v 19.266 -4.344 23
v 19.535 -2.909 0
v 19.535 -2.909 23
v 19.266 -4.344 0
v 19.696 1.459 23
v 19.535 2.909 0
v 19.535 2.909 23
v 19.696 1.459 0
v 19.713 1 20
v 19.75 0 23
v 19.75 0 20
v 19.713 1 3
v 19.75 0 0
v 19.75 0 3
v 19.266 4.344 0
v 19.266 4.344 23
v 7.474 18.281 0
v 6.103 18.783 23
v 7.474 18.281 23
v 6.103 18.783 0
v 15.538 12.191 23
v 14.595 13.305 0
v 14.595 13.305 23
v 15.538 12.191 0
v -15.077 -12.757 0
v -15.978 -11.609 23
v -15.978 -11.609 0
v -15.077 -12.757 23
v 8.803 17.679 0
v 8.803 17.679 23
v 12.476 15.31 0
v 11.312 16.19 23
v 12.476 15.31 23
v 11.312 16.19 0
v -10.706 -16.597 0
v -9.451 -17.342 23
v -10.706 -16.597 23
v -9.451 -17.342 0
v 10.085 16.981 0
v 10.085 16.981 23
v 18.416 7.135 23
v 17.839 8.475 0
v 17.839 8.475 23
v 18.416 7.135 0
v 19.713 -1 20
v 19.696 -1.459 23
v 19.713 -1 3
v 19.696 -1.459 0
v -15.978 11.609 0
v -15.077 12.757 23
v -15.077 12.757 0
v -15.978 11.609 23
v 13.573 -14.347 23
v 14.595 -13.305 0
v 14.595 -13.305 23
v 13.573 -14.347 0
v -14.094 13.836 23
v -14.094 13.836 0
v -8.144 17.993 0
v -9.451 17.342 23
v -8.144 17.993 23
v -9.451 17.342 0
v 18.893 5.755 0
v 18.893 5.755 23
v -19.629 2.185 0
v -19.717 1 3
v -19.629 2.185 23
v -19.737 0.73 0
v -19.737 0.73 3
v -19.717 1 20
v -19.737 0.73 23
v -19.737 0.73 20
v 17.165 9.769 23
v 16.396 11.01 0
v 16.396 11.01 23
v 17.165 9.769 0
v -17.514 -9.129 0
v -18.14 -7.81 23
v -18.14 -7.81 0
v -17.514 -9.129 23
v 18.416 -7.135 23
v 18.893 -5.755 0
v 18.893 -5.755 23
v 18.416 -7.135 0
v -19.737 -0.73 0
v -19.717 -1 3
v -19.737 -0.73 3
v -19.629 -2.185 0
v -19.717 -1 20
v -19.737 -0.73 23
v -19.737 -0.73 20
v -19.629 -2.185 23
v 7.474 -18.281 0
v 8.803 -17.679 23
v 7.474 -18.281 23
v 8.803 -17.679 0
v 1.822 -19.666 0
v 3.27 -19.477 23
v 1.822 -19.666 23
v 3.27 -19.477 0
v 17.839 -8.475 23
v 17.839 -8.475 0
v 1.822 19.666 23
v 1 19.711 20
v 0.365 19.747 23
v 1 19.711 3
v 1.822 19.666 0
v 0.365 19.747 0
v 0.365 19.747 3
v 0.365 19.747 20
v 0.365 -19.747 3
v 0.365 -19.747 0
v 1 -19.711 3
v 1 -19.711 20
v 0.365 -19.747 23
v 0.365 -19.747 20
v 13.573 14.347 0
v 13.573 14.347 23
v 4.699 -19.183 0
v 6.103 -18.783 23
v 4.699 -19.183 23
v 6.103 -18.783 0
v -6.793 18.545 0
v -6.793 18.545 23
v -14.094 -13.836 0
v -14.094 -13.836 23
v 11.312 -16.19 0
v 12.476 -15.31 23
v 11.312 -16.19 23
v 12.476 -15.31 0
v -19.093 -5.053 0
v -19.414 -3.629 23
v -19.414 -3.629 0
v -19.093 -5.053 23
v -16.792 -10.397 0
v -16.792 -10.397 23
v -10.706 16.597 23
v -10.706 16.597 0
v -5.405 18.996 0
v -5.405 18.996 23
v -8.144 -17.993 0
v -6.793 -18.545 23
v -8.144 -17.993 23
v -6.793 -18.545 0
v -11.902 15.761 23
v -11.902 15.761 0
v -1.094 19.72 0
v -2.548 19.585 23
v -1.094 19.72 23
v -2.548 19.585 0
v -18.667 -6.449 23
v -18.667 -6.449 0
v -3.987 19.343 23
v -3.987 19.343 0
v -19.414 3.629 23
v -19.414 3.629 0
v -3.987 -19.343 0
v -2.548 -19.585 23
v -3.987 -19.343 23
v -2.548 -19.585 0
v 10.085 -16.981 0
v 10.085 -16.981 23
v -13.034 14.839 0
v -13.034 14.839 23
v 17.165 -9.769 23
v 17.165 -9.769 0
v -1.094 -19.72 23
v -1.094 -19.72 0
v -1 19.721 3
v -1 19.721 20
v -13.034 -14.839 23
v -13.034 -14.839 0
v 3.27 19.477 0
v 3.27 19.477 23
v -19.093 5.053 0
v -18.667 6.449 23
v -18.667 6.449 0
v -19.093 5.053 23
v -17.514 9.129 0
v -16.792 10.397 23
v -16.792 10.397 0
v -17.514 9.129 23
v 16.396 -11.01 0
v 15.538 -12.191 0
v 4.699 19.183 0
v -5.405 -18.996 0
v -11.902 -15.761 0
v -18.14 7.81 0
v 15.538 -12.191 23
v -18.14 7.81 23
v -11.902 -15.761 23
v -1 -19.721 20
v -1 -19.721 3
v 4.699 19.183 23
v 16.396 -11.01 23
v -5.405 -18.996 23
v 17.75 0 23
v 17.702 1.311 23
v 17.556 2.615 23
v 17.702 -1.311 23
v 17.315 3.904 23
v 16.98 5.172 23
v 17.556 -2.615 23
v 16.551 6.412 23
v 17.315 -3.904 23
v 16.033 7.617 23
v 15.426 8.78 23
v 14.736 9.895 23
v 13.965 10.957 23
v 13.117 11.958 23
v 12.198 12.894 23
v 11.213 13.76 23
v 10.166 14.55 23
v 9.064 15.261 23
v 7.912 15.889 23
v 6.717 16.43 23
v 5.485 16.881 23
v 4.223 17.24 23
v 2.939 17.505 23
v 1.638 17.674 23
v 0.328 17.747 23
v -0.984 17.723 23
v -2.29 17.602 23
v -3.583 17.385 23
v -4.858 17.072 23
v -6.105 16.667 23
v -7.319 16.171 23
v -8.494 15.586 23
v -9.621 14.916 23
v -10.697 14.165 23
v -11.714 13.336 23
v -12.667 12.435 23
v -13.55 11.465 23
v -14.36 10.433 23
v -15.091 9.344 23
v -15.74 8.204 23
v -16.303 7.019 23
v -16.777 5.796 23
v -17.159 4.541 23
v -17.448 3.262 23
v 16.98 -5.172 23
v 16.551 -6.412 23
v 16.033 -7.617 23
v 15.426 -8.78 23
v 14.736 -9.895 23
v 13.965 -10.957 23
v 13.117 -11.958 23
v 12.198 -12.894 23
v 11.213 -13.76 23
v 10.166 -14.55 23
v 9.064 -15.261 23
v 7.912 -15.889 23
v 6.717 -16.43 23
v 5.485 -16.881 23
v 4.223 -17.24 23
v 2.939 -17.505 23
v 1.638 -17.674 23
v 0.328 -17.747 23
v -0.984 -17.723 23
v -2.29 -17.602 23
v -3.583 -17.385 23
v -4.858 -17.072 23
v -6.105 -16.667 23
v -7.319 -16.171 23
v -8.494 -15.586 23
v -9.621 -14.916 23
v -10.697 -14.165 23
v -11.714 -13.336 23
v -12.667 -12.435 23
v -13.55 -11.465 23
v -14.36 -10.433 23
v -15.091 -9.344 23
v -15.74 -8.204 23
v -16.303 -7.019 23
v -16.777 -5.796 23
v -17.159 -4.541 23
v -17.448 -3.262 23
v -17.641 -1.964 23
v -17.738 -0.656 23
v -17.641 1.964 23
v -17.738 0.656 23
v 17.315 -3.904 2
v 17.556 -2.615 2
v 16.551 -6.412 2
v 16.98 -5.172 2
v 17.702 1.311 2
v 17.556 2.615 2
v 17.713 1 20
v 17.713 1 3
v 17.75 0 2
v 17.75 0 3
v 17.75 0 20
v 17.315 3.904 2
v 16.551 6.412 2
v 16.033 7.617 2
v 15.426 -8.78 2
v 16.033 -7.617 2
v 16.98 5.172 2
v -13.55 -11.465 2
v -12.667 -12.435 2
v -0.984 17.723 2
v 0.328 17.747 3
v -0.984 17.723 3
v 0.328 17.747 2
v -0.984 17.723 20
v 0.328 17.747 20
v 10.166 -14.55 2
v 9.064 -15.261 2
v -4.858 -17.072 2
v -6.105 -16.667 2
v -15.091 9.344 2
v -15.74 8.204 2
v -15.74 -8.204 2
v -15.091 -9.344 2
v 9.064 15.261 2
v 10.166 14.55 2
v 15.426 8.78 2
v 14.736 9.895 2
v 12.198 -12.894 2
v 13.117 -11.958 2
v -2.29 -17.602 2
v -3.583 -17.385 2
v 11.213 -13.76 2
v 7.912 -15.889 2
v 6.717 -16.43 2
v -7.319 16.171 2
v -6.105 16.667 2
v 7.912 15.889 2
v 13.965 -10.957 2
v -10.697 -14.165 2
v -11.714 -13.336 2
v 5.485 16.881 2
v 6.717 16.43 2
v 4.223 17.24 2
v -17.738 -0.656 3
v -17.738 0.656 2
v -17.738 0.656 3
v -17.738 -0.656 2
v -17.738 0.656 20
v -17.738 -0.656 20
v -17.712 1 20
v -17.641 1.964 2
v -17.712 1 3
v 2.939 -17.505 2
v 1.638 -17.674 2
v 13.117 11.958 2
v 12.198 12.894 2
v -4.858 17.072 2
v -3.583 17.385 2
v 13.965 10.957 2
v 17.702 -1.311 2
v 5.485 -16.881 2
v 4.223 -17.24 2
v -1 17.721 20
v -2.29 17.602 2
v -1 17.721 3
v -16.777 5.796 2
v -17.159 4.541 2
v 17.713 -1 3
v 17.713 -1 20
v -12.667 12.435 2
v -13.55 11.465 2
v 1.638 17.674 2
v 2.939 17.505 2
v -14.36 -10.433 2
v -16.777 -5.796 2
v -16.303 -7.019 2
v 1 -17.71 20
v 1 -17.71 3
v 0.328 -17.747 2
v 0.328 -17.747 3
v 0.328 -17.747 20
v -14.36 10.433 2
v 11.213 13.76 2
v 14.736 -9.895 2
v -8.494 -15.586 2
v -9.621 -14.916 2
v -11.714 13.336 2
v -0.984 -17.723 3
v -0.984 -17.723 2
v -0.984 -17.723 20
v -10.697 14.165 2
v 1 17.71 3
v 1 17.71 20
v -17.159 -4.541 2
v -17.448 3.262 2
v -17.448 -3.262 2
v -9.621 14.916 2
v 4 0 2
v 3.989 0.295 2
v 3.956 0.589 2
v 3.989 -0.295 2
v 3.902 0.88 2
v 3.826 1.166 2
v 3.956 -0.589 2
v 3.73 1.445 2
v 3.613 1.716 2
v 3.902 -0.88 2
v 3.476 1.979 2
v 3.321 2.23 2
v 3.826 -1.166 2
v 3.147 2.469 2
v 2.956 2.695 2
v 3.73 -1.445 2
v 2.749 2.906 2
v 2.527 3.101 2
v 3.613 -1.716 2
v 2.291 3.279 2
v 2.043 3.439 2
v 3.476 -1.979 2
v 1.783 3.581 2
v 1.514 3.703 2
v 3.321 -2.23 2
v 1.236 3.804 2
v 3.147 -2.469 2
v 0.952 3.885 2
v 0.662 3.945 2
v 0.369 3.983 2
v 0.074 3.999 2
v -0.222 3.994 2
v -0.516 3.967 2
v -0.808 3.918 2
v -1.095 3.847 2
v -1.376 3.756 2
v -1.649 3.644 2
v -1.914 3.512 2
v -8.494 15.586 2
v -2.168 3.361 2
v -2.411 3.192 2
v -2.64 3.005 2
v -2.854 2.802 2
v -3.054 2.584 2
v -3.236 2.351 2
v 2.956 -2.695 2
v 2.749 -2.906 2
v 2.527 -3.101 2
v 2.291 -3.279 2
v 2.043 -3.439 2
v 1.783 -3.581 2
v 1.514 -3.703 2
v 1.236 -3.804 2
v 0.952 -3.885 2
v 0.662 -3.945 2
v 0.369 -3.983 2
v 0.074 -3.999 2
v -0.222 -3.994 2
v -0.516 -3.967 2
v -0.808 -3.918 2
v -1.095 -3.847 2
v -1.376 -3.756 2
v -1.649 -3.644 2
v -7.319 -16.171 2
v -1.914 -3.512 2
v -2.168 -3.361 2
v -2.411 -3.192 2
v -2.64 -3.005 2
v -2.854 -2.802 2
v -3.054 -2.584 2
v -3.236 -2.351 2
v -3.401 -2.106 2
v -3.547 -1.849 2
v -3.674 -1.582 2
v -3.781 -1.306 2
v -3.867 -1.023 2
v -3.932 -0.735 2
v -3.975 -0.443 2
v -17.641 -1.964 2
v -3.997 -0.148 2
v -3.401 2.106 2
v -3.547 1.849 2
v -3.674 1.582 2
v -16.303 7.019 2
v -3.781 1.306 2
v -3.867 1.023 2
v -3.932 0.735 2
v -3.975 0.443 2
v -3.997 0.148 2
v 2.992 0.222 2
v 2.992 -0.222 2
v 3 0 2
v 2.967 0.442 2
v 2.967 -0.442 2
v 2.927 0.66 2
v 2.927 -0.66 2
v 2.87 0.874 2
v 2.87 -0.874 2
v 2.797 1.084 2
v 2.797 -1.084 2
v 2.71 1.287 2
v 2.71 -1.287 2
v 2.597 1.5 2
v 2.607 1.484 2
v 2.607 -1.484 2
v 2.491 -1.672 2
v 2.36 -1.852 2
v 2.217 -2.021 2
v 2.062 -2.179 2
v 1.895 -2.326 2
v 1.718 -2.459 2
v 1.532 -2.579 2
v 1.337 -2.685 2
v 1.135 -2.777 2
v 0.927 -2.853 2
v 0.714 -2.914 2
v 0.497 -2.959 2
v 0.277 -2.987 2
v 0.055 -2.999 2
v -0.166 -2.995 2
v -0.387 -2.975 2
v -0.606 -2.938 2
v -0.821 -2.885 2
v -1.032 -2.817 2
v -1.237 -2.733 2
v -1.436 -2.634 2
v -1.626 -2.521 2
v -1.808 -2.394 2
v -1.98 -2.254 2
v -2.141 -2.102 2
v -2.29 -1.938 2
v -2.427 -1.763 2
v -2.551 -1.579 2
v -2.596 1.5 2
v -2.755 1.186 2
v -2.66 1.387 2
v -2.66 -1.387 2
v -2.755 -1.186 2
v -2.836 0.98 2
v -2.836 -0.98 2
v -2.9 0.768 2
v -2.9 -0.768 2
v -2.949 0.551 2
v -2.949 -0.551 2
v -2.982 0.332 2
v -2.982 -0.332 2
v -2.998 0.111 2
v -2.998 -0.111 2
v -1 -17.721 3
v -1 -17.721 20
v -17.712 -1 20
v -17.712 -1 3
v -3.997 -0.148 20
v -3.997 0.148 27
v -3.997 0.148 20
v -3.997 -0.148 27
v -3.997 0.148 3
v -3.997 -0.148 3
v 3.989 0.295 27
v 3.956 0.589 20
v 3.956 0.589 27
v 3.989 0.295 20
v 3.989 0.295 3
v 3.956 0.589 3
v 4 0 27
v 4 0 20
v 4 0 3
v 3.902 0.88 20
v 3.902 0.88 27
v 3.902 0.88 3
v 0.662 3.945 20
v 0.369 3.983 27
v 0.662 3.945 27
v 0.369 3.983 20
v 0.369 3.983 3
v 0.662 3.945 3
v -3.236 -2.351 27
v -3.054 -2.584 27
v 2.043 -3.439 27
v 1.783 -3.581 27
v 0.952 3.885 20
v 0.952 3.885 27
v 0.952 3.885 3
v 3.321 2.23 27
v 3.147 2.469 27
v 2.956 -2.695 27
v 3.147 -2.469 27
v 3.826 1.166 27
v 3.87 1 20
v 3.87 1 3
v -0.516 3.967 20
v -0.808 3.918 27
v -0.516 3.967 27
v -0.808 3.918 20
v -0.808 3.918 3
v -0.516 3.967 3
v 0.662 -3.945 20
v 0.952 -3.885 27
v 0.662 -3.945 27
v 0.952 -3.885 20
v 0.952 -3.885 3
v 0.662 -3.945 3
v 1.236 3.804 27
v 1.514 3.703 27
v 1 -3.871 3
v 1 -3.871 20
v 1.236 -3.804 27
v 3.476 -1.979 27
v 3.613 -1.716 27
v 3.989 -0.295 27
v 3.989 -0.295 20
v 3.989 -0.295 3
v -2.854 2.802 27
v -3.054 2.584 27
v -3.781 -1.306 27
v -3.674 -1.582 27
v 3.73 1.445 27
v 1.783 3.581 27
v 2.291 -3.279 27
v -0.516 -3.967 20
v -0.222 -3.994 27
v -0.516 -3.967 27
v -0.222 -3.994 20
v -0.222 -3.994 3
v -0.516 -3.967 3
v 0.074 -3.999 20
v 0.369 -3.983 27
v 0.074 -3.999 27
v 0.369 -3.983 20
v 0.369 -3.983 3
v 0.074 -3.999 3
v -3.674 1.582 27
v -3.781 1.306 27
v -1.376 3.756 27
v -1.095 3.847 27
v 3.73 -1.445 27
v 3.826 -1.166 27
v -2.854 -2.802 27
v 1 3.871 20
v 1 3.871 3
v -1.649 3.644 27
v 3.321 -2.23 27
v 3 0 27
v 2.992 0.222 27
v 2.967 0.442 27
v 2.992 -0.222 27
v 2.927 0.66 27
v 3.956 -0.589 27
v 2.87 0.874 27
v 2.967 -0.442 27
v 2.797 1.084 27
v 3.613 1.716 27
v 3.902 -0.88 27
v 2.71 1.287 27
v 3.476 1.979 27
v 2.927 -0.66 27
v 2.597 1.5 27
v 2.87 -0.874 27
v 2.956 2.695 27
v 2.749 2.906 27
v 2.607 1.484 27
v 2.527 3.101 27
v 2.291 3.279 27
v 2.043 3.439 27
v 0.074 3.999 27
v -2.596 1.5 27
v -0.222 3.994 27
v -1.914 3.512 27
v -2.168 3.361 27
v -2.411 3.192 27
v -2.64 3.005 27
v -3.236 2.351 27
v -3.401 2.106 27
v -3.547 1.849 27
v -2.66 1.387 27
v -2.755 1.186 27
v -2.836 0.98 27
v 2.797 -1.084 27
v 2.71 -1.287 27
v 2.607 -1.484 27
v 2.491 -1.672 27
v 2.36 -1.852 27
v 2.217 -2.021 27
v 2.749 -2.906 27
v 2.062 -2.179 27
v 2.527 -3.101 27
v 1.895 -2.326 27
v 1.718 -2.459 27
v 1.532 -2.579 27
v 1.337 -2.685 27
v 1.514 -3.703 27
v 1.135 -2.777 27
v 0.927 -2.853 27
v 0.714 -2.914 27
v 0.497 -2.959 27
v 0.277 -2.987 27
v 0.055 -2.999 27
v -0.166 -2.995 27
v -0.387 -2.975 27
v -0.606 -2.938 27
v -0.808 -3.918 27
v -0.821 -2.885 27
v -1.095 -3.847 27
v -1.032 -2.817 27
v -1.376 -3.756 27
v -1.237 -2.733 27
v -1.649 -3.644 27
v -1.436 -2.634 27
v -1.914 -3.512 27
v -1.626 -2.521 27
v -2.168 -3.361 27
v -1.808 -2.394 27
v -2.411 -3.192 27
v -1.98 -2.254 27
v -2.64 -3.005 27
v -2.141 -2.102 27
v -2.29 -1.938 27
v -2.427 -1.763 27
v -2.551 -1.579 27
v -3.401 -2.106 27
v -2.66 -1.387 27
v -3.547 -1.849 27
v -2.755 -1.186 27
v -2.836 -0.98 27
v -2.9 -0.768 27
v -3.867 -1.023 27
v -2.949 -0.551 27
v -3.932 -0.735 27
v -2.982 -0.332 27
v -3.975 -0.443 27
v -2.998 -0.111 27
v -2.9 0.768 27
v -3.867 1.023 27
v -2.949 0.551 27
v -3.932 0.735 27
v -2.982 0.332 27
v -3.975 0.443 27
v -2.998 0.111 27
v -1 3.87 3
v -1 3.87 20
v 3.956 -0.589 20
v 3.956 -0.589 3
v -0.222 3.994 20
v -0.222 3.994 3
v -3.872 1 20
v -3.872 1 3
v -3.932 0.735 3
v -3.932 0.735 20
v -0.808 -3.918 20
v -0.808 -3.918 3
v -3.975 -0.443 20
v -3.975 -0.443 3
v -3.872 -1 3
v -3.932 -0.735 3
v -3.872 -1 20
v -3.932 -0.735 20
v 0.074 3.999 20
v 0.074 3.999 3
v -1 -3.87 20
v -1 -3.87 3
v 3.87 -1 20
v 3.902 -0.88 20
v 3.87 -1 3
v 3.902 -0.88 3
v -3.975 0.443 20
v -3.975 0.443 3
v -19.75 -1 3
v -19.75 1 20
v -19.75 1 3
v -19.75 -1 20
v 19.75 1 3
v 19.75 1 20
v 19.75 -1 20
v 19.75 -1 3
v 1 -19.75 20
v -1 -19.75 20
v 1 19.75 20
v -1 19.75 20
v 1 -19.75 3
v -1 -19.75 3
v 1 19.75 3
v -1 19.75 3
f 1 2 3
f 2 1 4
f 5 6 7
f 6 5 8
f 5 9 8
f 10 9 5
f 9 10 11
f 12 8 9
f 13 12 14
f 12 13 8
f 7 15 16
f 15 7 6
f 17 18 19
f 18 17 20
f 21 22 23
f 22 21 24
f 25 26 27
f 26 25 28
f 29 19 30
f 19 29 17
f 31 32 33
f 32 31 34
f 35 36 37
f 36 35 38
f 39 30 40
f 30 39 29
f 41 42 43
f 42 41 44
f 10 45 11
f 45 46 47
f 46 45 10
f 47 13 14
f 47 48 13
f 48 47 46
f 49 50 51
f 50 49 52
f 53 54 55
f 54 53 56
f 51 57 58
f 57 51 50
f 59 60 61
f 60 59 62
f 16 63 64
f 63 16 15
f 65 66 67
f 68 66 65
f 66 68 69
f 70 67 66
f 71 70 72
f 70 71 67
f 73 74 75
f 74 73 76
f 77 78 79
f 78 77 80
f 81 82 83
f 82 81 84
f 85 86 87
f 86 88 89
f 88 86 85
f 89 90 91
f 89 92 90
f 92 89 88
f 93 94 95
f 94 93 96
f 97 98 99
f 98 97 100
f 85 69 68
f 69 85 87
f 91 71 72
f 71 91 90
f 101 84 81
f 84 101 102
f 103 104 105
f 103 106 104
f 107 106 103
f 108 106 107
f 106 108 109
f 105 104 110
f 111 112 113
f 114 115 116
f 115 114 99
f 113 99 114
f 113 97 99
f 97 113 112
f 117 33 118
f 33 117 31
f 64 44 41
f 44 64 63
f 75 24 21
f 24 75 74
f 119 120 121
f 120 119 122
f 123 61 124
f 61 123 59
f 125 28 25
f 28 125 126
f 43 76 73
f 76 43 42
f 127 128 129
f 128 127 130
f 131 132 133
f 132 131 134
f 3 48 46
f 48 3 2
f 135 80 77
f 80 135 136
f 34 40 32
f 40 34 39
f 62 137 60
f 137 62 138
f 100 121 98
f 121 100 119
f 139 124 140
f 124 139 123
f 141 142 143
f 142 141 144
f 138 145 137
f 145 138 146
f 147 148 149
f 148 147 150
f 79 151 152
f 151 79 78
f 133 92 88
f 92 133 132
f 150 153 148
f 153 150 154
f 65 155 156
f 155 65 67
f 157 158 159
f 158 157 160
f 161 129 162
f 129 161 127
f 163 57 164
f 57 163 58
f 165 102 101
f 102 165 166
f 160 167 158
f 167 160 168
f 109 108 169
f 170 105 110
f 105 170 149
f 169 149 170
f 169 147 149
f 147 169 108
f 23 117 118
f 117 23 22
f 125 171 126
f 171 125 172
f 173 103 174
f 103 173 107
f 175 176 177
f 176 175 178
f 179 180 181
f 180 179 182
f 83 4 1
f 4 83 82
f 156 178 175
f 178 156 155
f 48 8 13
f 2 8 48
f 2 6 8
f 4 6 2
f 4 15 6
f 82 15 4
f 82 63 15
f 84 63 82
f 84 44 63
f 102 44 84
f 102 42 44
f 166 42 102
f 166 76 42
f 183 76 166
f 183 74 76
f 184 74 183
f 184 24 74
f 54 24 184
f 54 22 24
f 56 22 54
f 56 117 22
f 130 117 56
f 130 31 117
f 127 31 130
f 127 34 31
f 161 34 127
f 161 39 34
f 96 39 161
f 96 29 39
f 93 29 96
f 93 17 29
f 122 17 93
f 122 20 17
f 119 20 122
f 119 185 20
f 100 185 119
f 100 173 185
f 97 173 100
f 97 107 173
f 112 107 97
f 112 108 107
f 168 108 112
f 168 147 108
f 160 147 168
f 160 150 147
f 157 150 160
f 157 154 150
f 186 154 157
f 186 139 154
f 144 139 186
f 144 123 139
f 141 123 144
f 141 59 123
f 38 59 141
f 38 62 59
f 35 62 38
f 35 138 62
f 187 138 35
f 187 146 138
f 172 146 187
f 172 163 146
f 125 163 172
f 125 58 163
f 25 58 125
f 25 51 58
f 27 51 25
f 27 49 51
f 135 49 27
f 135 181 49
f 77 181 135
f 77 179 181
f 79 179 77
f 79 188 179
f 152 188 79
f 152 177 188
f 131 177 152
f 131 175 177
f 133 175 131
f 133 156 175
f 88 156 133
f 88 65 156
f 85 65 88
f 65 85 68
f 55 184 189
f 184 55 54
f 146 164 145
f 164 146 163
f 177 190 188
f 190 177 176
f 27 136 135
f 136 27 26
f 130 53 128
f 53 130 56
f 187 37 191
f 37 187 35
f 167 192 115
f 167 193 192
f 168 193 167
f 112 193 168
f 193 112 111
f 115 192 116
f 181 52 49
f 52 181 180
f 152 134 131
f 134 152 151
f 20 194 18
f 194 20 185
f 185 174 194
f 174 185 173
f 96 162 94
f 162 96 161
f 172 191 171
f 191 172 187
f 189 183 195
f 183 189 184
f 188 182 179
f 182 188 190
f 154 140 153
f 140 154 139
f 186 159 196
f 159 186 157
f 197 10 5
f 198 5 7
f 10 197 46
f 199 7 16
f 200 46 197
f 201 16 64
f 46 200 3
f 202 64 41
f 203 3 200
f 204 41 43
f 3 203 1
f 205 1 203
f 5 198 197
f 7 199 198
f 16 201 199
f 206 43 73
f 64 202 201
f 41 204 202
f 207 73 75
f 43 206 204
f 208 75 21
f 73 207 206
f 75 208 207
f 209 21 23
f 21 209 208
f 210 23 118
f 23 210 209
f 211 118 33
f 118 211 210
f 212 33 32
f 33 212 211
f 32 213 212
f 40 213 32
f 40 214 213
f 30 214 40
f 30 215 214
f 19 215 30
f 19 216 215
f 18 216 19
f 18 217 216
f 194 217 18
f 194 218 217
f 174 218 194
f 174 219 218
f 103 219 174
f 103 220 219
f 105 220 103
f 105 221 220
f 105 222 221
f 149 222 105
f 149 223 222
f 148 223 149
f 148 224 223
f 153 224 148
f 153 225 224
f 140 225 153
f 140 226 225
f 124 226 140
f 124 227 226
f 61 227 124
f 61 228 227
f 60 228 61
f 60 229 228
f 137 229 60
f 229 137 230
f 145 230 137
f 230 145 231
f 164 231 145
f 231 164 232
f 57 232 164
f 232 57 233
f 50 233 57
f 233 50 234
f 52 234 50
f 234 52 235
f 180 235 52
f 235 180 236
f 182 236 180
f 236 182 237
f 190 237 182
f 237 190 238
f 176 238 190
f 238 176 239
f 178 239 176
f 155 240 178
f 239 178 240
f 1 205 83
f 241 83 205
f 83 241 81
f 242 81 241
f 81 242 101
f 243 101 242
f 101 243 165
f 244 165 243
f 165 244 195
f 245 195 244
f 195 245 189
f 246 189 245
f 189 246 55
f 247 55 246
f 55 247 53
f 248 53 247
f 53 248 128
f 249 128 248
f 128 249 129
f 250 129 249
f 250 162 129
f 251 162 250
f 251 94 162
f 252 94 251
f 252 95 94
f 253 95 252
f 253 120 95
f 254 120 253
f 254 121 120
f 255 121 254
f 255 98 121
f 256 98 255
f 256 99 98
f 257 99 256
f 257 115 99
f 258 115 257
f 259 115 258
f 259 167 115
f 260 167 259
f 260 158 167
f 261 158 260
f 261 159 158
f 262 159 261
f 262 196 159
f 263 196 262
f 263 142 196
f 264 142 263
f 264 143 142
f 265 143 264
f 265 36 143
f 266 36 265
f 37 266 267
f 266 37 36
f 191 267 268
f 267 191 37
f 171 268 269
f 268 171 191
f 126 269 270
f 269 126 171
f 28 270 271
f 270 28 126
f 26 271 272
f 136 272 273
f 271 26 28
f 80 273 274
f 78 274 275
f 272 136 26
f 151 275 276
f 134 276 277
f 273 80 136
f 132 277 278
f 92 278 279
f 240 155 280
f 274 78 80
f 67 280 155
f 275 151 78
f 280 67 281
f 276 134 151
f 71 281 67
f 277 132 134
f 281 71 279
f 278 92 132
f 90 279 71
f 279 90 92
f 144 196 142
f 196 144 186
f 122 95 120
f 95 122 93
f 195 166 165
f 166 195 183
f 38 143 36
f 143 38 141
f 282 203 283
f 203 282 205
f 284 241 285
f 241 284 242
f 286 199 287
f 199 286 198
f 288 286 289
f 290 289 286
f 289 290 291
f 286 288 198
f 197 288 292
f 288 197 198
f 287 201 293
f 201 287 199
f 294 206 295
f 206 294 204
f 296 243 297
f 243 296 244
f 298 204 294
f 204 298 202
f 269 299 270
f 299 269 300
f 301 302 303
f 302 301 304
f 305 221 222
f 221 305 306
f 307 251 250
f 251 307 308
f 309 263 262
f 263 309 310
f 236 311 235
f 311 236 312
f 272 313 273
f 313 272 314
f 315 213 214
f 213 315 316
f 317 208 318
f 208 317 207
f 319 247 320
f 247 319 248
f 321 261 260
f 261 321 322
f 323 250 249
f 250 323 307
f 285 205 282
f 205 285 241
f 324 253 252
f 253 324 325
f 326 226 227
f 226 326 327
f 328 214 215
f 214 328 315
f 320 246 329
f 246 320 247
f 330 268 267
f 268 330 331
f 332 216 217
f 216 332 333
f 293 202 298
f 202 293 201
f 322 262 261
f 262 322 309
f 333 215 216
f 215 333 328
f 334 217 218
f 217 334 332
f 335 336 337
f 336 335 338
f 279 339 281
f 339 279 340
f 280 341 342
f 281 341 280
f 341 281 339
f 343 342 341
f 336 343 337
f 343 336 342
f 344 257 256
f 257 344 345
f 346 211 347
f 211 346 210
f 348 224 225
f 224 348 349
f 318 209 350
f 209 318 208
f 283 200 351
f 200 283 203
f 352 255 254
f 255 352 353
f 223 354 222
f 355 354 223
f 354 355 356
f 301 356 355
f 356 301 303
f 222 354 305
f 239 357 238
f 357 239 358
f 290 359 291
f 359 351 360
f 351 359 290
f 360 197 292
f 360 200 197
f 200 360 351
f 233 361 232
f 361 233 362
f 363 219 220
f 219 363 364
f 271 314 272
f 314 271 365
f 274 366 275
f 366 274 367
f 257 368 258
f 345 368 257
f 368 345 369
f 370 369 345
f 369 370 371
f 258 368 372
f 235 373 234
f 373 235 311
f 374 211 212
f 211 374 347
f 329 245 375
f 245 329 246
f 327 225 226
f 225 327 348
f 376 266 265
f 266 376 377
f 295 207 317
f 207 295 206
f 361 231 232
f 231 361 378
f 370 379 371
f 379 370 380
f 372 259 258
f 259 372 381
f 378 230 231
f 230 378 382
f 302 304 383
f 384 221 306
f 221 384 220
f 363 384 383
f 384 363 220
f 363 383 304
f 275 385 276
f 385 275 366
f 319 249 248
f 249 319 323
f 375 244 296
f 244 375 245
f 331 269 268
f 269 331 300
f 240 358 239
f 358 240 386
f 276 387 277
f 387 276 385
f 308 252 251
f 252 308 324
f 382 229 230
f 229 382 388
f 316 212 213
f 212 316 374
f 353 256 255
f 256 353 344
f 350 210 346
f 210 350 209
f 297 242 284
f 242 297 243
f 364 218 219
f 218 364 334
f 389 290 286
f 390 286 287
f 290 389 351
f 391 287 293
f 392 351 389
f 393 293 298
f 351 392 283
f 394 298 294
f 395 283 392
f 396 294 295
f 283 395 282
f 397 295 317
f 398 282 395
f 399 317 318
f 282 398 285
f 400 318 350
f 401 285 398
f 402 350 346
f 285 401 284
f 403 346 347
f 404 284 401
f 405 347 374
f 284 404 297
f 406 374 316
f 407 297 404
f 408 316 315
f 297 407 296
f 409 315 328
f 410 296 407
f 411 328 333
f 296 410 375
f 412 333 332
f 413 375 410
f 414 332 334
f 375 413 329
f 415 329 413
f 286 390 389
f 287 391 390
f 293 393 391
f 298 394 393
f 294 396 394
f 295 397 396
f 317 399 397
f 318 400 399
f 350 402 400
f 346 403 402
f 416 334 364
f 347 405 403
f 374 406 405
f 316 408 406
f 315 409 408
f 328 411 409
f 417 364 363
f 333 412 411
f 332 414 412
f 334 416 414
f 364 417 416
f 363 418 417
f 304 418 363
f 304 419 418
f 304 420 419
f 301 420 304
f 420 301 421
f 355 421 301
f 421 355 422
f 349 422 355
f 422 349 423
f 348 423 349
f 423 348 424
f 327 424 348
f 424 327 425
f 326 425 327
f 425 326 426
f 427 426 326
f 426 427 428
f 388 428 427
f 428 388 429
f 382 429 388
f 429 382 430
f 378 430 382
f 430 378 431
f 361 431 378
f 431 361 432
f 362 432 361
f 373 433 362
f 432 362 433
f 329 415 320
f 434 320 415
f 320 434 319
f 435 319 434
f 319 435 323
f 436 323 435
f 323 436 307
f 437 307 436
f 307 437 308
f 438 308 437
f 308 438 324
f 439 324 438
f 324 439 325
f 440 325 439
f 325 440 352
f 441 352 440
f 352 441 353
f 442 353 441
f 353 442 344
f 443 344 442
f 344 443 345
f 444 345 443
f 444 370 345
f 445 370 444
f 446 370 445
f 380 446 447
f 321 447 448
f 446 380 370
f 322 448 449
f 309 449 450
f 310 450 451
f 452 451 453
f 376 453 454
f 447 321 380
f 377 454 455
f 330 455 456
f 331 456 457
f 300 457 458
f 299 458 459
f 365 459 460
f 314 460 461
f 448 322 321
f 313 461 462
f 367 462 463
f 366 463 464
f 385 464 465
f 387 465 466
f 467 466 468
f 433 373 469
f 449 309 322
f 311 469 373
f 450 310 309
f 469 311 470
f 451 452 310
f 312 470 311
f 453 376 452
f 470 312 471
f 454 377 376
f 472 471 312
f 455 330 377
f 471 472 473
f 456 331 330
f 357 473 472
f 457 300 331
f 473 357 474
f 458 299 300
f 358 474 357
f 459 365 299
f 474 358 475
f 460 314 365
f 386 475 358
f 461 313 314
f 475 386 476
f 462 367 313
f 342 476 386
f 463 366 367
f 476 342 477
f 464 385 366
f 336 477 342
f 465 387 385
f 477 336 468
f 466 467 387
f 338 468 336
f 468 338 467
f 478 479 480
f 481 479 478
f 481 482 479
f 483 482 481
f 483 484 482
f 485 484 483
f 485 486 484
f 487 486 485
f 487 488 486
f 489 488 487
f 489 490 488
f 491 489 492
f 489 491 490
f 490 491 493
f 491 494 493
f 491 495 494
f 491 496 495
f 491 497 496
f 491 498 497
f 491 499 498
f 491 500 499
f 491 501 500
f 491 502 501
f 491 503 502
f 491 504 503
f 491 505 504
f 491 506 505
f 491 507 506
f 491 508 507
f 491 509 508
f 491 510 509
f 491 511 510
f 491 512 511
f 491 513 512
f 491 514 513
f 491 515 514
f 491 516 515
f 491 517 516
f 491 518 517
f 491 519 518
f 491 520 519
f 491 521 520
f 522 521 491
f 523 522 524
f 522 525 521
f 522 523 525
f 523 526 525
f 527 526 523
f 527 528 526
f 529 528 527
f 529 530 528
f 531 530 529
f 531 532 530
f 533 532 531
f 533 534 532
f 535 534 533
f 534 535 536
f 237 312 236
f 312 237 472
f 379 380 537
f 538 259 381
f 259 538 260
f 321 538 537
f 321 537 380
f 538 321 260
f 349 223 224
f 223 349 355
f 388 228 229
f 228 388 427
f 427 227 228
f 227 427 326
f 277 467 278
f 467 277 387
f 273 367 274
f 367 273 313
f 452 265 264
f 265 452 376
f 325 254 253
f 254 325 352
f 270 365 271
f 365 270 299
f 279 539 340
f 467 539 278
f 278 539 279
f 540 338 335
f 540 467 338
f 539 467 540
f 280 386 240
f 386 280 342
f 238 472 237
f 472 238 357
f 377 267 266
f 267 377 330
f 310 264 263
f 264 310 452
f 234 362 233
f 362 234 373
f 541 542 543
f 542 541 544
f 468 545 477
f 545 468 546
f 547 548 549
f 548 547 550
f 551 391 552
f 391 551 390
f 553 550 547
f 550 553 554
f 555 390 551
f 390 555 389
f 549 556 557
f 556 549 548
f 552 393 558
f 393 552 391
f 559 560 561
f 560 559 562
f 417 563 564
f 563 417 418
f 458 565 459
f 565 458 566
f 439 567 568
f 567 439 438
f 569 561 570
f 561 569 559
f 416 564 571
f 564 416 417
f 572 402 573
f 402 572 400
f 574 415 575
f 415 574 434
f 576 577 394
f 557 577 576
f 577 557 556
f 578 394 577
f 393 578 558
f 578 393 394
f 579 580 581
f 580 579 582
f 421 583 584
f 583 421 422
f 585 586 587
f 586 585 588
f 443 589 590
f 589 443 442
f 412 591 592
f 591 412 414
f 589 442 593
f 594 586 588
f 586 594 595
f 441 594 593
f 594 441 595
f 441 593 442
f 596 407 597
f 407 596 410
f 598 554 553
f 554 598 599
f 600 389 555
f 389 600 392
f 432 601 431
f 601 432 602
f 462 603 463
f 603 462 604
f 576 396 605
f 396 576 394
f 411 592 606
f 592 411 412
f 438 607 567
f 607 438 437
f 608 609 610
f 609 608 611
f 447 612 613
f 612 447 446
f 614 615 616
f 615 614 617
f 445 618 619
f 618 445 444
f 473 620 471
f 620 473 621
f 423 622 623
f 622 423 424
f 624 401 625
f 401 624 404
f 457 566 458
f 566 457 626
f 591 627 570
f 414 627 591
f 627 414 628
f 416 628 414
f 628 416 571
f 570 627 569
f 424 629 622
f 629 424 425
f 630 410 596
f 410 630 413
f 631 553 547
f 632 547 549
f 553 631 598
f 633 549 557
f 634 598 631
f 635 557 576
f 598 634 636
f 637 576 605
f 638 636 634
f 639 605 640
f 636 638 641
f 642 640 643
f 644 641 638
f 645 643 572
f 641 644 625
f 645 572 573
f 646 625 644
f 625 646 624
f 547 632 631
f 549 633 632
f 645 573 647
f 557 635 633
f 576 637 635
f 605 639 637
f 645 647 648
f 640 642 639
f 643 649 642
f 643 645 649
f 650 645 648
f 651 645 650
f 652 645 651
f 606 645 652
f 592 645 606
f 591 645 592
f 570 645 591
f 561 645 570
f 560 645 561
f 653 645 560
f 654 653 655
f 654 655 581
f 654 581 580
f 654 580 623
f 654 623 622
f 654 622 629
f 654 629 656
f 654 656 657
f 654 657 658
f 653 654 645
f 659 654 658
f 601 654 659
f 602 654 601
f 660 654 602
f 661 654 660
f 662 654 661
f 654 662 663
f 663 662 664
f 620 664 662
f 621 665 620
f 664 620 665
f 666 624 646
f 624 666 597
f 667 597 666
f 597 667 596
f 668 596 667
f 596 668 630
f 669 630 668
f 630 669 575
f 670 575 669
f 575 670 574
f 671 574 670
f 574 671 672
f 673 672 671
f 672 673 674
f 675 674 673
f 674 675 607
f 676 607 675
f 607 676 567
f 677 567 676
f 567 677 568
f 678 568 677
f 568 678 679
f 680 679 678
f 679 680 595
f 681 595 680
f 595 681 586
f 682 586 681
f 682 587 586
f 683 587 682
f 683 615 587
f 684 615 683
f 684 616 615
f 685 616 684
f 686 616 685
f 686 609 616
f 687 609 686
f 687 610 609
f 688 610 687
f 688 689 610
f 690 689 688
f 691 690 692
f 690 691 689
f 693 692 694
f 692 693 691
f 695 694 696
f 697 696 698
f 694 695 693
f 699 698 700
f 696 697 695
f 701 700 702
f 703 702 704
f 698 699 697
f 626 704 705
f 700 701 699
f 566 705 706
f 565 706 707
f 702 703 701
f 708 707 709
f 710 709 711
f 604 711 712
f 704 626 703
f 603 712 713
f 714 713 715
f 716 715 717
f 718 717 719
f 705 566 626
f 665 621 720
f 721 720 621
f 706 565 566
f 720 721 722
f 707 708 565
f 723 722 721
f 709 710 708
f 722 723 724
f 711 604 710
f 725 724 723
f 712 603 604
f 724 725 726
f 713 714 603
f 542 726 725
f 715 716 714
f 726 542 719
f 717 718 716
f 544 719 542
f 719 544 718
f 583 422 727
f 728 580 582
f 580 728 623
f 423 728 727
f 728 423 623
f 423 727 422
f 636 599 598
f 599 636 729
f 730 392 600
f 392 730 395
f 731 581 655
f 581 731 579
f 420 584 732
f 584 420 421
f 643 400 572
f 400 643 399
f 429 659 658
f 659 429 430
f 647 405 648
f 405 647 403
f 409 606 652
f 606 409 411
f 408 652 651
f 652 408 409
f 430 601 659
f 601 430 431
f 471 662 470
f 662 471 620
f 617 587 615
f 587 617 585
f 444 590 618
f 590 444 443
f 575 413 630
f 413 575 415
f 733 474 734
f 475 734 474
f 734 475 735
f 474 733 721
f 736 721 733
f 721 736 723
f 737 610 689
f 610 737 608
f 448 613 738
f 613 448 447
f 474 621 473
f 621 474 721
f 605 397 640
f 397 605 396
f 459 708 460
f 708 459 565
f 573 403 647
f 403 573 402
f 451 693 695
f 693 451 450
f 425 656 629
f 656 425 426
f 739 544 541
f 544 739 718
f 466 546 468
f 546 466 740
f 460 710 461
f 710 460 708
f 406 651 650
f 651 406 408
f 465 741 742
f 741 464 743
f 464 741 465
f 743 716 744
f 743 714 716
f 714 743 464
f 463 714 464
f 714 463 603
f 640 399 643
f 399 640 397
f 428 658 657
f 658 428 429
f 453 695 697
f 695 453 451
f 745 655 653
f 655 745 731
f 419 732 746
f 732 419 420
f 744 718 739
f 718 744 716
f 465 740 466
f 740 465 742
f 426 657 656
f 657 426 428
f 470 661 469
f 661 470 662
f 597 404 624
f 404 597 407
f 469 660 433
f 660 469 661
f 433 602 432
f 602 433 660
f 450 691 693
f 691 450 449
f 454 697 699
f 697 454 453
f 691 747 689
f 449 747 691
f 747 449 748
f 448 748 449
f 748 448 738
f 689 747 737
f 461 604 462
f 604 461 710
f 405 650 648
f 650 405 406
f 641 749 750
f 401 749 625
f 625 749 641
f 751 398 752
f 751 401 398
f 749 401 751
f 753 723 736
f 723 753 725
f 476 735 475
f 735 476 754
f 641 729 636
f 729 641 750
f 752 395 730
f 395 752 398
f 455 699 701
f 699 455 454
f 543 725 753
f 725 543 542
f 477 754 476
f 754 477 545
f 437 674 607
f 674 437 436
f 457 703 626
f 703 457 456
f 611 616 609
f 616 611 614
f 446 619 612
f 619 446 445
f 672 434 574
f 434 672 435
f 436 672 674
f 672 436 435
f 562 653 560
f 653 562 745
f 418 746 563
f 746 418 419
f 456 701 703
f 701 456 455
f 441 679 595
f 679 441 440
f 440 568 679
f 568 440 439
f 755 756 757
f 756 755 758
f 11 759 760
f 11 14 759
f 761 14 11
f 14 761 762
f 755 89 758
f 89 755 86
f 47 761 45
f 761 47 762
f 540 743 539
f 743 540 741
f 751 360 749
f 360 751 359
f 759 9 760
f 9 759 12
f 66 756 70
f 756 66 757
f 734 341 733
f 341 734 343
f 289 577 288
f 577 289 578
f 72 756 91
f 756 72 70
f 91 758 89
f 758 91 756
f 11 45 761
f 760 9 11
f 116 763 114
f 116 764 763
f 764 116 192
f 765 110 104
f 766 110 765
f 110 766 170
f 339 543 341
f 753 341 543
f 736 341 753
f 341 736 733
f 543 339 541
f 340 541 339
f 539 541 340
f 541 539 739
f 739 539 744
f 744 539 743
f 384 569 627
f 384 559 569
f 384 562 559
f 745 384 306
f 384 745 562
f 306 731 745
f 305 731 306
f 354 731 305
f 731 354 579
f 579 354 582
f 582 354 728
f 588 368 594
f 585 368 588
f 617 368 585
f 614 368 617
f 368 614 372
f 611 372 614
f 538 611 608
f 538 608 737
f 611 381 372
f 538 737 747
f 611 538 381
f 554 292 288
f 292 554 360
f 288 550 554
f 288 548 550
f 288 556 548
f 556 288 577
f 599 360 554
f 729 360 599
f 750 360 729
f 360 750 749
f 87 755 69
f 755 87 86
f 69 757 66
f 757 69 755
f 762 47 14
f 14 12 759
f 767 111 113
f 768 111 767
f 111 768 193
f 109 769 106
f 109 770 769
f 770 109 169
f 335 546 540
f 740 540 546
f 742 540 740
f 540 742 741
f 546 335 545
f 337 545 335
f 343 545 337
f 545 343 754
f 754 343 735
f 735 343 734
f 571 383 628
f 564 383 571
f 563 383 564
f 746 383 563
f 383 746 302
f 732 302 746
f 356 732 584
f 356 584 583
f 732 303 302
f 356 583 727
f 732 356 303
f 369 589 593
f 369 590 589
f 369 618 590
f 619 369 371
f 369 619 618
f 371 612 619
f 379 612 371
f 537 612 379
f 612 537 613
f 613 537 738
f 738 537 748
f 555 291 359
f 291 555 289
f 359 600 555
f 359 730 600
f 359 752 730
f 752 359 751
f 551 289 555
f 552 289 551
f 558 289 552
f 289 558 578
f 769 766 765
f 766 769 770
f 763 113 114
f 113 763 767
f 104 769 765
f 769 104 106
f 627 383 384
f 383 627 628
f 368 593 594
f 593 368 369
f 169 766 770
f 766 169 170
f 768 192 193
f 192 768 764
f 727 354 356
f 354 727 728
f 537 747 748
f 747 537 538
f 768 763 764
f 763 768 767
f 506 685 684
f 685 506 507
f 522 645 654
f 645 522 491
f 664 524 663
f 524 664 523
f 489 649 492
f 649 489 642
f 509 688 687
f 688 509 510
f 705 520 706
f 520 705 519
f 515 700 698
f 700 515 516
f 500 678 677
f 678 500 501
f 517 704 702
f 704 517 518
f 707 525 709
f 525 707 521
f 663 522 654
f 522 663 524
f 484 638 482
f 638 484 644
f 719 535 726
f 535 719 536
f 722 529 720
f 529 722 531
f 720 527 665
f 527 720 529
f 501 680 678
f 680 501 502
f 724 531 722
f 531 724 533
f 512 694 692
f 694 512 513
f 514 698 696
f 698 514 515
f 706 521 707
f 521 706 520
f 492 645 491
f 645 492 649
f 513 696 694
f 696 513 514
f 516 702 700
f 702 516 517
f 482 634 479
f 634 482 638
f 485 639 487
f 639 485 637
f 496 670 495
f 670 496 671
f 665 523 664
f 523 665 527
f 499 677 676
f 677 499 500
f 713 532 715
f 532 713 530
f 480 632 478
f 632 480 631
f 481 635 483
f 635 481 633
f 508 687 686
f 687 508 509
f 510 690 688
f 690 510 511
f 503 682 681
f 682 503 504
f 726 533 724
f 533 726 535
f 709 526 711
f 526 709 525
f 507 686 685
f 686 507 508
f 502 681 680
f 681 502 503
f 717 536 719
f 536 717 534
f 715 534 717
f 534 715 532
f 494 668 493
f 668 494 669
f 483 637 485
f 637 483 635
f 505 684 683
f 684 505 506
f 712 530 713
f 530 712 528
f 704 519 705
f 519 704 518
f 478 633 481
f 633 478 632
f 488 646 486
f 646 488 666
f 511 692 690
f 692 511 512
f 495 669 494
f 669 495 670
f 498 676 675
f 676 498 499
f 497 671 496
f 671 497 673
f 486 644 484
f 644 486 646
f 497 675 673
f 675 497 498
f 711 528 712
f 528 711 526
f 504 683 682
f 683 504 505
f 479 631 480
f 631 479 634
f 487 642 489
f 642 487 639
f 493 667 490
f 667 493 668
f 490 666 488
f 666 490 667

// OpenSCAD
$fn = 85;

// todo notch showing position: use sharpie

// central column
centre_height = 27;
centre_diameter = 8;
r = 3; // radius of circle for pot
d = 1.5; // distance from centre to chord
c = 2*sqrt(r^2 - d^2); // chord length

// outer circle/knob
knob_height = 23;
knob_outer_diameter = 39.5;
knob_inner_diameter = 35.5;
knob_base_thickness = 2;
support_thickness = 2;
support_height = 17;

// outer circle
difference () {
    cylinder(d=knob_outer_diameter,h=knob_height);
    translate([0, 0, knob_base_thickness]) 
    cylinder(d=knob_inner_diameter,h=knob_height);
}

// centre piece
difference () {
    union() {
        cylinder(d=centre_diameter,h=centre_height);
        // supports
        translate([0, 0, knob_height/2]) rotate([90, 0, 0]) cube([knob_outer_diameter, support_height, support_thickness], center=true);
        translate([0, 0, knob_height/2]) rotate([90, 0, 90]) cube([knob_outer_diameter, support_height, support_thickness], center=true);
    }
    
    linear_extrude(height=centre_height)
    difference() {
        circle(r);
        translate([-c/2, d, 0]) square([c, d], center = false);
    }
}
